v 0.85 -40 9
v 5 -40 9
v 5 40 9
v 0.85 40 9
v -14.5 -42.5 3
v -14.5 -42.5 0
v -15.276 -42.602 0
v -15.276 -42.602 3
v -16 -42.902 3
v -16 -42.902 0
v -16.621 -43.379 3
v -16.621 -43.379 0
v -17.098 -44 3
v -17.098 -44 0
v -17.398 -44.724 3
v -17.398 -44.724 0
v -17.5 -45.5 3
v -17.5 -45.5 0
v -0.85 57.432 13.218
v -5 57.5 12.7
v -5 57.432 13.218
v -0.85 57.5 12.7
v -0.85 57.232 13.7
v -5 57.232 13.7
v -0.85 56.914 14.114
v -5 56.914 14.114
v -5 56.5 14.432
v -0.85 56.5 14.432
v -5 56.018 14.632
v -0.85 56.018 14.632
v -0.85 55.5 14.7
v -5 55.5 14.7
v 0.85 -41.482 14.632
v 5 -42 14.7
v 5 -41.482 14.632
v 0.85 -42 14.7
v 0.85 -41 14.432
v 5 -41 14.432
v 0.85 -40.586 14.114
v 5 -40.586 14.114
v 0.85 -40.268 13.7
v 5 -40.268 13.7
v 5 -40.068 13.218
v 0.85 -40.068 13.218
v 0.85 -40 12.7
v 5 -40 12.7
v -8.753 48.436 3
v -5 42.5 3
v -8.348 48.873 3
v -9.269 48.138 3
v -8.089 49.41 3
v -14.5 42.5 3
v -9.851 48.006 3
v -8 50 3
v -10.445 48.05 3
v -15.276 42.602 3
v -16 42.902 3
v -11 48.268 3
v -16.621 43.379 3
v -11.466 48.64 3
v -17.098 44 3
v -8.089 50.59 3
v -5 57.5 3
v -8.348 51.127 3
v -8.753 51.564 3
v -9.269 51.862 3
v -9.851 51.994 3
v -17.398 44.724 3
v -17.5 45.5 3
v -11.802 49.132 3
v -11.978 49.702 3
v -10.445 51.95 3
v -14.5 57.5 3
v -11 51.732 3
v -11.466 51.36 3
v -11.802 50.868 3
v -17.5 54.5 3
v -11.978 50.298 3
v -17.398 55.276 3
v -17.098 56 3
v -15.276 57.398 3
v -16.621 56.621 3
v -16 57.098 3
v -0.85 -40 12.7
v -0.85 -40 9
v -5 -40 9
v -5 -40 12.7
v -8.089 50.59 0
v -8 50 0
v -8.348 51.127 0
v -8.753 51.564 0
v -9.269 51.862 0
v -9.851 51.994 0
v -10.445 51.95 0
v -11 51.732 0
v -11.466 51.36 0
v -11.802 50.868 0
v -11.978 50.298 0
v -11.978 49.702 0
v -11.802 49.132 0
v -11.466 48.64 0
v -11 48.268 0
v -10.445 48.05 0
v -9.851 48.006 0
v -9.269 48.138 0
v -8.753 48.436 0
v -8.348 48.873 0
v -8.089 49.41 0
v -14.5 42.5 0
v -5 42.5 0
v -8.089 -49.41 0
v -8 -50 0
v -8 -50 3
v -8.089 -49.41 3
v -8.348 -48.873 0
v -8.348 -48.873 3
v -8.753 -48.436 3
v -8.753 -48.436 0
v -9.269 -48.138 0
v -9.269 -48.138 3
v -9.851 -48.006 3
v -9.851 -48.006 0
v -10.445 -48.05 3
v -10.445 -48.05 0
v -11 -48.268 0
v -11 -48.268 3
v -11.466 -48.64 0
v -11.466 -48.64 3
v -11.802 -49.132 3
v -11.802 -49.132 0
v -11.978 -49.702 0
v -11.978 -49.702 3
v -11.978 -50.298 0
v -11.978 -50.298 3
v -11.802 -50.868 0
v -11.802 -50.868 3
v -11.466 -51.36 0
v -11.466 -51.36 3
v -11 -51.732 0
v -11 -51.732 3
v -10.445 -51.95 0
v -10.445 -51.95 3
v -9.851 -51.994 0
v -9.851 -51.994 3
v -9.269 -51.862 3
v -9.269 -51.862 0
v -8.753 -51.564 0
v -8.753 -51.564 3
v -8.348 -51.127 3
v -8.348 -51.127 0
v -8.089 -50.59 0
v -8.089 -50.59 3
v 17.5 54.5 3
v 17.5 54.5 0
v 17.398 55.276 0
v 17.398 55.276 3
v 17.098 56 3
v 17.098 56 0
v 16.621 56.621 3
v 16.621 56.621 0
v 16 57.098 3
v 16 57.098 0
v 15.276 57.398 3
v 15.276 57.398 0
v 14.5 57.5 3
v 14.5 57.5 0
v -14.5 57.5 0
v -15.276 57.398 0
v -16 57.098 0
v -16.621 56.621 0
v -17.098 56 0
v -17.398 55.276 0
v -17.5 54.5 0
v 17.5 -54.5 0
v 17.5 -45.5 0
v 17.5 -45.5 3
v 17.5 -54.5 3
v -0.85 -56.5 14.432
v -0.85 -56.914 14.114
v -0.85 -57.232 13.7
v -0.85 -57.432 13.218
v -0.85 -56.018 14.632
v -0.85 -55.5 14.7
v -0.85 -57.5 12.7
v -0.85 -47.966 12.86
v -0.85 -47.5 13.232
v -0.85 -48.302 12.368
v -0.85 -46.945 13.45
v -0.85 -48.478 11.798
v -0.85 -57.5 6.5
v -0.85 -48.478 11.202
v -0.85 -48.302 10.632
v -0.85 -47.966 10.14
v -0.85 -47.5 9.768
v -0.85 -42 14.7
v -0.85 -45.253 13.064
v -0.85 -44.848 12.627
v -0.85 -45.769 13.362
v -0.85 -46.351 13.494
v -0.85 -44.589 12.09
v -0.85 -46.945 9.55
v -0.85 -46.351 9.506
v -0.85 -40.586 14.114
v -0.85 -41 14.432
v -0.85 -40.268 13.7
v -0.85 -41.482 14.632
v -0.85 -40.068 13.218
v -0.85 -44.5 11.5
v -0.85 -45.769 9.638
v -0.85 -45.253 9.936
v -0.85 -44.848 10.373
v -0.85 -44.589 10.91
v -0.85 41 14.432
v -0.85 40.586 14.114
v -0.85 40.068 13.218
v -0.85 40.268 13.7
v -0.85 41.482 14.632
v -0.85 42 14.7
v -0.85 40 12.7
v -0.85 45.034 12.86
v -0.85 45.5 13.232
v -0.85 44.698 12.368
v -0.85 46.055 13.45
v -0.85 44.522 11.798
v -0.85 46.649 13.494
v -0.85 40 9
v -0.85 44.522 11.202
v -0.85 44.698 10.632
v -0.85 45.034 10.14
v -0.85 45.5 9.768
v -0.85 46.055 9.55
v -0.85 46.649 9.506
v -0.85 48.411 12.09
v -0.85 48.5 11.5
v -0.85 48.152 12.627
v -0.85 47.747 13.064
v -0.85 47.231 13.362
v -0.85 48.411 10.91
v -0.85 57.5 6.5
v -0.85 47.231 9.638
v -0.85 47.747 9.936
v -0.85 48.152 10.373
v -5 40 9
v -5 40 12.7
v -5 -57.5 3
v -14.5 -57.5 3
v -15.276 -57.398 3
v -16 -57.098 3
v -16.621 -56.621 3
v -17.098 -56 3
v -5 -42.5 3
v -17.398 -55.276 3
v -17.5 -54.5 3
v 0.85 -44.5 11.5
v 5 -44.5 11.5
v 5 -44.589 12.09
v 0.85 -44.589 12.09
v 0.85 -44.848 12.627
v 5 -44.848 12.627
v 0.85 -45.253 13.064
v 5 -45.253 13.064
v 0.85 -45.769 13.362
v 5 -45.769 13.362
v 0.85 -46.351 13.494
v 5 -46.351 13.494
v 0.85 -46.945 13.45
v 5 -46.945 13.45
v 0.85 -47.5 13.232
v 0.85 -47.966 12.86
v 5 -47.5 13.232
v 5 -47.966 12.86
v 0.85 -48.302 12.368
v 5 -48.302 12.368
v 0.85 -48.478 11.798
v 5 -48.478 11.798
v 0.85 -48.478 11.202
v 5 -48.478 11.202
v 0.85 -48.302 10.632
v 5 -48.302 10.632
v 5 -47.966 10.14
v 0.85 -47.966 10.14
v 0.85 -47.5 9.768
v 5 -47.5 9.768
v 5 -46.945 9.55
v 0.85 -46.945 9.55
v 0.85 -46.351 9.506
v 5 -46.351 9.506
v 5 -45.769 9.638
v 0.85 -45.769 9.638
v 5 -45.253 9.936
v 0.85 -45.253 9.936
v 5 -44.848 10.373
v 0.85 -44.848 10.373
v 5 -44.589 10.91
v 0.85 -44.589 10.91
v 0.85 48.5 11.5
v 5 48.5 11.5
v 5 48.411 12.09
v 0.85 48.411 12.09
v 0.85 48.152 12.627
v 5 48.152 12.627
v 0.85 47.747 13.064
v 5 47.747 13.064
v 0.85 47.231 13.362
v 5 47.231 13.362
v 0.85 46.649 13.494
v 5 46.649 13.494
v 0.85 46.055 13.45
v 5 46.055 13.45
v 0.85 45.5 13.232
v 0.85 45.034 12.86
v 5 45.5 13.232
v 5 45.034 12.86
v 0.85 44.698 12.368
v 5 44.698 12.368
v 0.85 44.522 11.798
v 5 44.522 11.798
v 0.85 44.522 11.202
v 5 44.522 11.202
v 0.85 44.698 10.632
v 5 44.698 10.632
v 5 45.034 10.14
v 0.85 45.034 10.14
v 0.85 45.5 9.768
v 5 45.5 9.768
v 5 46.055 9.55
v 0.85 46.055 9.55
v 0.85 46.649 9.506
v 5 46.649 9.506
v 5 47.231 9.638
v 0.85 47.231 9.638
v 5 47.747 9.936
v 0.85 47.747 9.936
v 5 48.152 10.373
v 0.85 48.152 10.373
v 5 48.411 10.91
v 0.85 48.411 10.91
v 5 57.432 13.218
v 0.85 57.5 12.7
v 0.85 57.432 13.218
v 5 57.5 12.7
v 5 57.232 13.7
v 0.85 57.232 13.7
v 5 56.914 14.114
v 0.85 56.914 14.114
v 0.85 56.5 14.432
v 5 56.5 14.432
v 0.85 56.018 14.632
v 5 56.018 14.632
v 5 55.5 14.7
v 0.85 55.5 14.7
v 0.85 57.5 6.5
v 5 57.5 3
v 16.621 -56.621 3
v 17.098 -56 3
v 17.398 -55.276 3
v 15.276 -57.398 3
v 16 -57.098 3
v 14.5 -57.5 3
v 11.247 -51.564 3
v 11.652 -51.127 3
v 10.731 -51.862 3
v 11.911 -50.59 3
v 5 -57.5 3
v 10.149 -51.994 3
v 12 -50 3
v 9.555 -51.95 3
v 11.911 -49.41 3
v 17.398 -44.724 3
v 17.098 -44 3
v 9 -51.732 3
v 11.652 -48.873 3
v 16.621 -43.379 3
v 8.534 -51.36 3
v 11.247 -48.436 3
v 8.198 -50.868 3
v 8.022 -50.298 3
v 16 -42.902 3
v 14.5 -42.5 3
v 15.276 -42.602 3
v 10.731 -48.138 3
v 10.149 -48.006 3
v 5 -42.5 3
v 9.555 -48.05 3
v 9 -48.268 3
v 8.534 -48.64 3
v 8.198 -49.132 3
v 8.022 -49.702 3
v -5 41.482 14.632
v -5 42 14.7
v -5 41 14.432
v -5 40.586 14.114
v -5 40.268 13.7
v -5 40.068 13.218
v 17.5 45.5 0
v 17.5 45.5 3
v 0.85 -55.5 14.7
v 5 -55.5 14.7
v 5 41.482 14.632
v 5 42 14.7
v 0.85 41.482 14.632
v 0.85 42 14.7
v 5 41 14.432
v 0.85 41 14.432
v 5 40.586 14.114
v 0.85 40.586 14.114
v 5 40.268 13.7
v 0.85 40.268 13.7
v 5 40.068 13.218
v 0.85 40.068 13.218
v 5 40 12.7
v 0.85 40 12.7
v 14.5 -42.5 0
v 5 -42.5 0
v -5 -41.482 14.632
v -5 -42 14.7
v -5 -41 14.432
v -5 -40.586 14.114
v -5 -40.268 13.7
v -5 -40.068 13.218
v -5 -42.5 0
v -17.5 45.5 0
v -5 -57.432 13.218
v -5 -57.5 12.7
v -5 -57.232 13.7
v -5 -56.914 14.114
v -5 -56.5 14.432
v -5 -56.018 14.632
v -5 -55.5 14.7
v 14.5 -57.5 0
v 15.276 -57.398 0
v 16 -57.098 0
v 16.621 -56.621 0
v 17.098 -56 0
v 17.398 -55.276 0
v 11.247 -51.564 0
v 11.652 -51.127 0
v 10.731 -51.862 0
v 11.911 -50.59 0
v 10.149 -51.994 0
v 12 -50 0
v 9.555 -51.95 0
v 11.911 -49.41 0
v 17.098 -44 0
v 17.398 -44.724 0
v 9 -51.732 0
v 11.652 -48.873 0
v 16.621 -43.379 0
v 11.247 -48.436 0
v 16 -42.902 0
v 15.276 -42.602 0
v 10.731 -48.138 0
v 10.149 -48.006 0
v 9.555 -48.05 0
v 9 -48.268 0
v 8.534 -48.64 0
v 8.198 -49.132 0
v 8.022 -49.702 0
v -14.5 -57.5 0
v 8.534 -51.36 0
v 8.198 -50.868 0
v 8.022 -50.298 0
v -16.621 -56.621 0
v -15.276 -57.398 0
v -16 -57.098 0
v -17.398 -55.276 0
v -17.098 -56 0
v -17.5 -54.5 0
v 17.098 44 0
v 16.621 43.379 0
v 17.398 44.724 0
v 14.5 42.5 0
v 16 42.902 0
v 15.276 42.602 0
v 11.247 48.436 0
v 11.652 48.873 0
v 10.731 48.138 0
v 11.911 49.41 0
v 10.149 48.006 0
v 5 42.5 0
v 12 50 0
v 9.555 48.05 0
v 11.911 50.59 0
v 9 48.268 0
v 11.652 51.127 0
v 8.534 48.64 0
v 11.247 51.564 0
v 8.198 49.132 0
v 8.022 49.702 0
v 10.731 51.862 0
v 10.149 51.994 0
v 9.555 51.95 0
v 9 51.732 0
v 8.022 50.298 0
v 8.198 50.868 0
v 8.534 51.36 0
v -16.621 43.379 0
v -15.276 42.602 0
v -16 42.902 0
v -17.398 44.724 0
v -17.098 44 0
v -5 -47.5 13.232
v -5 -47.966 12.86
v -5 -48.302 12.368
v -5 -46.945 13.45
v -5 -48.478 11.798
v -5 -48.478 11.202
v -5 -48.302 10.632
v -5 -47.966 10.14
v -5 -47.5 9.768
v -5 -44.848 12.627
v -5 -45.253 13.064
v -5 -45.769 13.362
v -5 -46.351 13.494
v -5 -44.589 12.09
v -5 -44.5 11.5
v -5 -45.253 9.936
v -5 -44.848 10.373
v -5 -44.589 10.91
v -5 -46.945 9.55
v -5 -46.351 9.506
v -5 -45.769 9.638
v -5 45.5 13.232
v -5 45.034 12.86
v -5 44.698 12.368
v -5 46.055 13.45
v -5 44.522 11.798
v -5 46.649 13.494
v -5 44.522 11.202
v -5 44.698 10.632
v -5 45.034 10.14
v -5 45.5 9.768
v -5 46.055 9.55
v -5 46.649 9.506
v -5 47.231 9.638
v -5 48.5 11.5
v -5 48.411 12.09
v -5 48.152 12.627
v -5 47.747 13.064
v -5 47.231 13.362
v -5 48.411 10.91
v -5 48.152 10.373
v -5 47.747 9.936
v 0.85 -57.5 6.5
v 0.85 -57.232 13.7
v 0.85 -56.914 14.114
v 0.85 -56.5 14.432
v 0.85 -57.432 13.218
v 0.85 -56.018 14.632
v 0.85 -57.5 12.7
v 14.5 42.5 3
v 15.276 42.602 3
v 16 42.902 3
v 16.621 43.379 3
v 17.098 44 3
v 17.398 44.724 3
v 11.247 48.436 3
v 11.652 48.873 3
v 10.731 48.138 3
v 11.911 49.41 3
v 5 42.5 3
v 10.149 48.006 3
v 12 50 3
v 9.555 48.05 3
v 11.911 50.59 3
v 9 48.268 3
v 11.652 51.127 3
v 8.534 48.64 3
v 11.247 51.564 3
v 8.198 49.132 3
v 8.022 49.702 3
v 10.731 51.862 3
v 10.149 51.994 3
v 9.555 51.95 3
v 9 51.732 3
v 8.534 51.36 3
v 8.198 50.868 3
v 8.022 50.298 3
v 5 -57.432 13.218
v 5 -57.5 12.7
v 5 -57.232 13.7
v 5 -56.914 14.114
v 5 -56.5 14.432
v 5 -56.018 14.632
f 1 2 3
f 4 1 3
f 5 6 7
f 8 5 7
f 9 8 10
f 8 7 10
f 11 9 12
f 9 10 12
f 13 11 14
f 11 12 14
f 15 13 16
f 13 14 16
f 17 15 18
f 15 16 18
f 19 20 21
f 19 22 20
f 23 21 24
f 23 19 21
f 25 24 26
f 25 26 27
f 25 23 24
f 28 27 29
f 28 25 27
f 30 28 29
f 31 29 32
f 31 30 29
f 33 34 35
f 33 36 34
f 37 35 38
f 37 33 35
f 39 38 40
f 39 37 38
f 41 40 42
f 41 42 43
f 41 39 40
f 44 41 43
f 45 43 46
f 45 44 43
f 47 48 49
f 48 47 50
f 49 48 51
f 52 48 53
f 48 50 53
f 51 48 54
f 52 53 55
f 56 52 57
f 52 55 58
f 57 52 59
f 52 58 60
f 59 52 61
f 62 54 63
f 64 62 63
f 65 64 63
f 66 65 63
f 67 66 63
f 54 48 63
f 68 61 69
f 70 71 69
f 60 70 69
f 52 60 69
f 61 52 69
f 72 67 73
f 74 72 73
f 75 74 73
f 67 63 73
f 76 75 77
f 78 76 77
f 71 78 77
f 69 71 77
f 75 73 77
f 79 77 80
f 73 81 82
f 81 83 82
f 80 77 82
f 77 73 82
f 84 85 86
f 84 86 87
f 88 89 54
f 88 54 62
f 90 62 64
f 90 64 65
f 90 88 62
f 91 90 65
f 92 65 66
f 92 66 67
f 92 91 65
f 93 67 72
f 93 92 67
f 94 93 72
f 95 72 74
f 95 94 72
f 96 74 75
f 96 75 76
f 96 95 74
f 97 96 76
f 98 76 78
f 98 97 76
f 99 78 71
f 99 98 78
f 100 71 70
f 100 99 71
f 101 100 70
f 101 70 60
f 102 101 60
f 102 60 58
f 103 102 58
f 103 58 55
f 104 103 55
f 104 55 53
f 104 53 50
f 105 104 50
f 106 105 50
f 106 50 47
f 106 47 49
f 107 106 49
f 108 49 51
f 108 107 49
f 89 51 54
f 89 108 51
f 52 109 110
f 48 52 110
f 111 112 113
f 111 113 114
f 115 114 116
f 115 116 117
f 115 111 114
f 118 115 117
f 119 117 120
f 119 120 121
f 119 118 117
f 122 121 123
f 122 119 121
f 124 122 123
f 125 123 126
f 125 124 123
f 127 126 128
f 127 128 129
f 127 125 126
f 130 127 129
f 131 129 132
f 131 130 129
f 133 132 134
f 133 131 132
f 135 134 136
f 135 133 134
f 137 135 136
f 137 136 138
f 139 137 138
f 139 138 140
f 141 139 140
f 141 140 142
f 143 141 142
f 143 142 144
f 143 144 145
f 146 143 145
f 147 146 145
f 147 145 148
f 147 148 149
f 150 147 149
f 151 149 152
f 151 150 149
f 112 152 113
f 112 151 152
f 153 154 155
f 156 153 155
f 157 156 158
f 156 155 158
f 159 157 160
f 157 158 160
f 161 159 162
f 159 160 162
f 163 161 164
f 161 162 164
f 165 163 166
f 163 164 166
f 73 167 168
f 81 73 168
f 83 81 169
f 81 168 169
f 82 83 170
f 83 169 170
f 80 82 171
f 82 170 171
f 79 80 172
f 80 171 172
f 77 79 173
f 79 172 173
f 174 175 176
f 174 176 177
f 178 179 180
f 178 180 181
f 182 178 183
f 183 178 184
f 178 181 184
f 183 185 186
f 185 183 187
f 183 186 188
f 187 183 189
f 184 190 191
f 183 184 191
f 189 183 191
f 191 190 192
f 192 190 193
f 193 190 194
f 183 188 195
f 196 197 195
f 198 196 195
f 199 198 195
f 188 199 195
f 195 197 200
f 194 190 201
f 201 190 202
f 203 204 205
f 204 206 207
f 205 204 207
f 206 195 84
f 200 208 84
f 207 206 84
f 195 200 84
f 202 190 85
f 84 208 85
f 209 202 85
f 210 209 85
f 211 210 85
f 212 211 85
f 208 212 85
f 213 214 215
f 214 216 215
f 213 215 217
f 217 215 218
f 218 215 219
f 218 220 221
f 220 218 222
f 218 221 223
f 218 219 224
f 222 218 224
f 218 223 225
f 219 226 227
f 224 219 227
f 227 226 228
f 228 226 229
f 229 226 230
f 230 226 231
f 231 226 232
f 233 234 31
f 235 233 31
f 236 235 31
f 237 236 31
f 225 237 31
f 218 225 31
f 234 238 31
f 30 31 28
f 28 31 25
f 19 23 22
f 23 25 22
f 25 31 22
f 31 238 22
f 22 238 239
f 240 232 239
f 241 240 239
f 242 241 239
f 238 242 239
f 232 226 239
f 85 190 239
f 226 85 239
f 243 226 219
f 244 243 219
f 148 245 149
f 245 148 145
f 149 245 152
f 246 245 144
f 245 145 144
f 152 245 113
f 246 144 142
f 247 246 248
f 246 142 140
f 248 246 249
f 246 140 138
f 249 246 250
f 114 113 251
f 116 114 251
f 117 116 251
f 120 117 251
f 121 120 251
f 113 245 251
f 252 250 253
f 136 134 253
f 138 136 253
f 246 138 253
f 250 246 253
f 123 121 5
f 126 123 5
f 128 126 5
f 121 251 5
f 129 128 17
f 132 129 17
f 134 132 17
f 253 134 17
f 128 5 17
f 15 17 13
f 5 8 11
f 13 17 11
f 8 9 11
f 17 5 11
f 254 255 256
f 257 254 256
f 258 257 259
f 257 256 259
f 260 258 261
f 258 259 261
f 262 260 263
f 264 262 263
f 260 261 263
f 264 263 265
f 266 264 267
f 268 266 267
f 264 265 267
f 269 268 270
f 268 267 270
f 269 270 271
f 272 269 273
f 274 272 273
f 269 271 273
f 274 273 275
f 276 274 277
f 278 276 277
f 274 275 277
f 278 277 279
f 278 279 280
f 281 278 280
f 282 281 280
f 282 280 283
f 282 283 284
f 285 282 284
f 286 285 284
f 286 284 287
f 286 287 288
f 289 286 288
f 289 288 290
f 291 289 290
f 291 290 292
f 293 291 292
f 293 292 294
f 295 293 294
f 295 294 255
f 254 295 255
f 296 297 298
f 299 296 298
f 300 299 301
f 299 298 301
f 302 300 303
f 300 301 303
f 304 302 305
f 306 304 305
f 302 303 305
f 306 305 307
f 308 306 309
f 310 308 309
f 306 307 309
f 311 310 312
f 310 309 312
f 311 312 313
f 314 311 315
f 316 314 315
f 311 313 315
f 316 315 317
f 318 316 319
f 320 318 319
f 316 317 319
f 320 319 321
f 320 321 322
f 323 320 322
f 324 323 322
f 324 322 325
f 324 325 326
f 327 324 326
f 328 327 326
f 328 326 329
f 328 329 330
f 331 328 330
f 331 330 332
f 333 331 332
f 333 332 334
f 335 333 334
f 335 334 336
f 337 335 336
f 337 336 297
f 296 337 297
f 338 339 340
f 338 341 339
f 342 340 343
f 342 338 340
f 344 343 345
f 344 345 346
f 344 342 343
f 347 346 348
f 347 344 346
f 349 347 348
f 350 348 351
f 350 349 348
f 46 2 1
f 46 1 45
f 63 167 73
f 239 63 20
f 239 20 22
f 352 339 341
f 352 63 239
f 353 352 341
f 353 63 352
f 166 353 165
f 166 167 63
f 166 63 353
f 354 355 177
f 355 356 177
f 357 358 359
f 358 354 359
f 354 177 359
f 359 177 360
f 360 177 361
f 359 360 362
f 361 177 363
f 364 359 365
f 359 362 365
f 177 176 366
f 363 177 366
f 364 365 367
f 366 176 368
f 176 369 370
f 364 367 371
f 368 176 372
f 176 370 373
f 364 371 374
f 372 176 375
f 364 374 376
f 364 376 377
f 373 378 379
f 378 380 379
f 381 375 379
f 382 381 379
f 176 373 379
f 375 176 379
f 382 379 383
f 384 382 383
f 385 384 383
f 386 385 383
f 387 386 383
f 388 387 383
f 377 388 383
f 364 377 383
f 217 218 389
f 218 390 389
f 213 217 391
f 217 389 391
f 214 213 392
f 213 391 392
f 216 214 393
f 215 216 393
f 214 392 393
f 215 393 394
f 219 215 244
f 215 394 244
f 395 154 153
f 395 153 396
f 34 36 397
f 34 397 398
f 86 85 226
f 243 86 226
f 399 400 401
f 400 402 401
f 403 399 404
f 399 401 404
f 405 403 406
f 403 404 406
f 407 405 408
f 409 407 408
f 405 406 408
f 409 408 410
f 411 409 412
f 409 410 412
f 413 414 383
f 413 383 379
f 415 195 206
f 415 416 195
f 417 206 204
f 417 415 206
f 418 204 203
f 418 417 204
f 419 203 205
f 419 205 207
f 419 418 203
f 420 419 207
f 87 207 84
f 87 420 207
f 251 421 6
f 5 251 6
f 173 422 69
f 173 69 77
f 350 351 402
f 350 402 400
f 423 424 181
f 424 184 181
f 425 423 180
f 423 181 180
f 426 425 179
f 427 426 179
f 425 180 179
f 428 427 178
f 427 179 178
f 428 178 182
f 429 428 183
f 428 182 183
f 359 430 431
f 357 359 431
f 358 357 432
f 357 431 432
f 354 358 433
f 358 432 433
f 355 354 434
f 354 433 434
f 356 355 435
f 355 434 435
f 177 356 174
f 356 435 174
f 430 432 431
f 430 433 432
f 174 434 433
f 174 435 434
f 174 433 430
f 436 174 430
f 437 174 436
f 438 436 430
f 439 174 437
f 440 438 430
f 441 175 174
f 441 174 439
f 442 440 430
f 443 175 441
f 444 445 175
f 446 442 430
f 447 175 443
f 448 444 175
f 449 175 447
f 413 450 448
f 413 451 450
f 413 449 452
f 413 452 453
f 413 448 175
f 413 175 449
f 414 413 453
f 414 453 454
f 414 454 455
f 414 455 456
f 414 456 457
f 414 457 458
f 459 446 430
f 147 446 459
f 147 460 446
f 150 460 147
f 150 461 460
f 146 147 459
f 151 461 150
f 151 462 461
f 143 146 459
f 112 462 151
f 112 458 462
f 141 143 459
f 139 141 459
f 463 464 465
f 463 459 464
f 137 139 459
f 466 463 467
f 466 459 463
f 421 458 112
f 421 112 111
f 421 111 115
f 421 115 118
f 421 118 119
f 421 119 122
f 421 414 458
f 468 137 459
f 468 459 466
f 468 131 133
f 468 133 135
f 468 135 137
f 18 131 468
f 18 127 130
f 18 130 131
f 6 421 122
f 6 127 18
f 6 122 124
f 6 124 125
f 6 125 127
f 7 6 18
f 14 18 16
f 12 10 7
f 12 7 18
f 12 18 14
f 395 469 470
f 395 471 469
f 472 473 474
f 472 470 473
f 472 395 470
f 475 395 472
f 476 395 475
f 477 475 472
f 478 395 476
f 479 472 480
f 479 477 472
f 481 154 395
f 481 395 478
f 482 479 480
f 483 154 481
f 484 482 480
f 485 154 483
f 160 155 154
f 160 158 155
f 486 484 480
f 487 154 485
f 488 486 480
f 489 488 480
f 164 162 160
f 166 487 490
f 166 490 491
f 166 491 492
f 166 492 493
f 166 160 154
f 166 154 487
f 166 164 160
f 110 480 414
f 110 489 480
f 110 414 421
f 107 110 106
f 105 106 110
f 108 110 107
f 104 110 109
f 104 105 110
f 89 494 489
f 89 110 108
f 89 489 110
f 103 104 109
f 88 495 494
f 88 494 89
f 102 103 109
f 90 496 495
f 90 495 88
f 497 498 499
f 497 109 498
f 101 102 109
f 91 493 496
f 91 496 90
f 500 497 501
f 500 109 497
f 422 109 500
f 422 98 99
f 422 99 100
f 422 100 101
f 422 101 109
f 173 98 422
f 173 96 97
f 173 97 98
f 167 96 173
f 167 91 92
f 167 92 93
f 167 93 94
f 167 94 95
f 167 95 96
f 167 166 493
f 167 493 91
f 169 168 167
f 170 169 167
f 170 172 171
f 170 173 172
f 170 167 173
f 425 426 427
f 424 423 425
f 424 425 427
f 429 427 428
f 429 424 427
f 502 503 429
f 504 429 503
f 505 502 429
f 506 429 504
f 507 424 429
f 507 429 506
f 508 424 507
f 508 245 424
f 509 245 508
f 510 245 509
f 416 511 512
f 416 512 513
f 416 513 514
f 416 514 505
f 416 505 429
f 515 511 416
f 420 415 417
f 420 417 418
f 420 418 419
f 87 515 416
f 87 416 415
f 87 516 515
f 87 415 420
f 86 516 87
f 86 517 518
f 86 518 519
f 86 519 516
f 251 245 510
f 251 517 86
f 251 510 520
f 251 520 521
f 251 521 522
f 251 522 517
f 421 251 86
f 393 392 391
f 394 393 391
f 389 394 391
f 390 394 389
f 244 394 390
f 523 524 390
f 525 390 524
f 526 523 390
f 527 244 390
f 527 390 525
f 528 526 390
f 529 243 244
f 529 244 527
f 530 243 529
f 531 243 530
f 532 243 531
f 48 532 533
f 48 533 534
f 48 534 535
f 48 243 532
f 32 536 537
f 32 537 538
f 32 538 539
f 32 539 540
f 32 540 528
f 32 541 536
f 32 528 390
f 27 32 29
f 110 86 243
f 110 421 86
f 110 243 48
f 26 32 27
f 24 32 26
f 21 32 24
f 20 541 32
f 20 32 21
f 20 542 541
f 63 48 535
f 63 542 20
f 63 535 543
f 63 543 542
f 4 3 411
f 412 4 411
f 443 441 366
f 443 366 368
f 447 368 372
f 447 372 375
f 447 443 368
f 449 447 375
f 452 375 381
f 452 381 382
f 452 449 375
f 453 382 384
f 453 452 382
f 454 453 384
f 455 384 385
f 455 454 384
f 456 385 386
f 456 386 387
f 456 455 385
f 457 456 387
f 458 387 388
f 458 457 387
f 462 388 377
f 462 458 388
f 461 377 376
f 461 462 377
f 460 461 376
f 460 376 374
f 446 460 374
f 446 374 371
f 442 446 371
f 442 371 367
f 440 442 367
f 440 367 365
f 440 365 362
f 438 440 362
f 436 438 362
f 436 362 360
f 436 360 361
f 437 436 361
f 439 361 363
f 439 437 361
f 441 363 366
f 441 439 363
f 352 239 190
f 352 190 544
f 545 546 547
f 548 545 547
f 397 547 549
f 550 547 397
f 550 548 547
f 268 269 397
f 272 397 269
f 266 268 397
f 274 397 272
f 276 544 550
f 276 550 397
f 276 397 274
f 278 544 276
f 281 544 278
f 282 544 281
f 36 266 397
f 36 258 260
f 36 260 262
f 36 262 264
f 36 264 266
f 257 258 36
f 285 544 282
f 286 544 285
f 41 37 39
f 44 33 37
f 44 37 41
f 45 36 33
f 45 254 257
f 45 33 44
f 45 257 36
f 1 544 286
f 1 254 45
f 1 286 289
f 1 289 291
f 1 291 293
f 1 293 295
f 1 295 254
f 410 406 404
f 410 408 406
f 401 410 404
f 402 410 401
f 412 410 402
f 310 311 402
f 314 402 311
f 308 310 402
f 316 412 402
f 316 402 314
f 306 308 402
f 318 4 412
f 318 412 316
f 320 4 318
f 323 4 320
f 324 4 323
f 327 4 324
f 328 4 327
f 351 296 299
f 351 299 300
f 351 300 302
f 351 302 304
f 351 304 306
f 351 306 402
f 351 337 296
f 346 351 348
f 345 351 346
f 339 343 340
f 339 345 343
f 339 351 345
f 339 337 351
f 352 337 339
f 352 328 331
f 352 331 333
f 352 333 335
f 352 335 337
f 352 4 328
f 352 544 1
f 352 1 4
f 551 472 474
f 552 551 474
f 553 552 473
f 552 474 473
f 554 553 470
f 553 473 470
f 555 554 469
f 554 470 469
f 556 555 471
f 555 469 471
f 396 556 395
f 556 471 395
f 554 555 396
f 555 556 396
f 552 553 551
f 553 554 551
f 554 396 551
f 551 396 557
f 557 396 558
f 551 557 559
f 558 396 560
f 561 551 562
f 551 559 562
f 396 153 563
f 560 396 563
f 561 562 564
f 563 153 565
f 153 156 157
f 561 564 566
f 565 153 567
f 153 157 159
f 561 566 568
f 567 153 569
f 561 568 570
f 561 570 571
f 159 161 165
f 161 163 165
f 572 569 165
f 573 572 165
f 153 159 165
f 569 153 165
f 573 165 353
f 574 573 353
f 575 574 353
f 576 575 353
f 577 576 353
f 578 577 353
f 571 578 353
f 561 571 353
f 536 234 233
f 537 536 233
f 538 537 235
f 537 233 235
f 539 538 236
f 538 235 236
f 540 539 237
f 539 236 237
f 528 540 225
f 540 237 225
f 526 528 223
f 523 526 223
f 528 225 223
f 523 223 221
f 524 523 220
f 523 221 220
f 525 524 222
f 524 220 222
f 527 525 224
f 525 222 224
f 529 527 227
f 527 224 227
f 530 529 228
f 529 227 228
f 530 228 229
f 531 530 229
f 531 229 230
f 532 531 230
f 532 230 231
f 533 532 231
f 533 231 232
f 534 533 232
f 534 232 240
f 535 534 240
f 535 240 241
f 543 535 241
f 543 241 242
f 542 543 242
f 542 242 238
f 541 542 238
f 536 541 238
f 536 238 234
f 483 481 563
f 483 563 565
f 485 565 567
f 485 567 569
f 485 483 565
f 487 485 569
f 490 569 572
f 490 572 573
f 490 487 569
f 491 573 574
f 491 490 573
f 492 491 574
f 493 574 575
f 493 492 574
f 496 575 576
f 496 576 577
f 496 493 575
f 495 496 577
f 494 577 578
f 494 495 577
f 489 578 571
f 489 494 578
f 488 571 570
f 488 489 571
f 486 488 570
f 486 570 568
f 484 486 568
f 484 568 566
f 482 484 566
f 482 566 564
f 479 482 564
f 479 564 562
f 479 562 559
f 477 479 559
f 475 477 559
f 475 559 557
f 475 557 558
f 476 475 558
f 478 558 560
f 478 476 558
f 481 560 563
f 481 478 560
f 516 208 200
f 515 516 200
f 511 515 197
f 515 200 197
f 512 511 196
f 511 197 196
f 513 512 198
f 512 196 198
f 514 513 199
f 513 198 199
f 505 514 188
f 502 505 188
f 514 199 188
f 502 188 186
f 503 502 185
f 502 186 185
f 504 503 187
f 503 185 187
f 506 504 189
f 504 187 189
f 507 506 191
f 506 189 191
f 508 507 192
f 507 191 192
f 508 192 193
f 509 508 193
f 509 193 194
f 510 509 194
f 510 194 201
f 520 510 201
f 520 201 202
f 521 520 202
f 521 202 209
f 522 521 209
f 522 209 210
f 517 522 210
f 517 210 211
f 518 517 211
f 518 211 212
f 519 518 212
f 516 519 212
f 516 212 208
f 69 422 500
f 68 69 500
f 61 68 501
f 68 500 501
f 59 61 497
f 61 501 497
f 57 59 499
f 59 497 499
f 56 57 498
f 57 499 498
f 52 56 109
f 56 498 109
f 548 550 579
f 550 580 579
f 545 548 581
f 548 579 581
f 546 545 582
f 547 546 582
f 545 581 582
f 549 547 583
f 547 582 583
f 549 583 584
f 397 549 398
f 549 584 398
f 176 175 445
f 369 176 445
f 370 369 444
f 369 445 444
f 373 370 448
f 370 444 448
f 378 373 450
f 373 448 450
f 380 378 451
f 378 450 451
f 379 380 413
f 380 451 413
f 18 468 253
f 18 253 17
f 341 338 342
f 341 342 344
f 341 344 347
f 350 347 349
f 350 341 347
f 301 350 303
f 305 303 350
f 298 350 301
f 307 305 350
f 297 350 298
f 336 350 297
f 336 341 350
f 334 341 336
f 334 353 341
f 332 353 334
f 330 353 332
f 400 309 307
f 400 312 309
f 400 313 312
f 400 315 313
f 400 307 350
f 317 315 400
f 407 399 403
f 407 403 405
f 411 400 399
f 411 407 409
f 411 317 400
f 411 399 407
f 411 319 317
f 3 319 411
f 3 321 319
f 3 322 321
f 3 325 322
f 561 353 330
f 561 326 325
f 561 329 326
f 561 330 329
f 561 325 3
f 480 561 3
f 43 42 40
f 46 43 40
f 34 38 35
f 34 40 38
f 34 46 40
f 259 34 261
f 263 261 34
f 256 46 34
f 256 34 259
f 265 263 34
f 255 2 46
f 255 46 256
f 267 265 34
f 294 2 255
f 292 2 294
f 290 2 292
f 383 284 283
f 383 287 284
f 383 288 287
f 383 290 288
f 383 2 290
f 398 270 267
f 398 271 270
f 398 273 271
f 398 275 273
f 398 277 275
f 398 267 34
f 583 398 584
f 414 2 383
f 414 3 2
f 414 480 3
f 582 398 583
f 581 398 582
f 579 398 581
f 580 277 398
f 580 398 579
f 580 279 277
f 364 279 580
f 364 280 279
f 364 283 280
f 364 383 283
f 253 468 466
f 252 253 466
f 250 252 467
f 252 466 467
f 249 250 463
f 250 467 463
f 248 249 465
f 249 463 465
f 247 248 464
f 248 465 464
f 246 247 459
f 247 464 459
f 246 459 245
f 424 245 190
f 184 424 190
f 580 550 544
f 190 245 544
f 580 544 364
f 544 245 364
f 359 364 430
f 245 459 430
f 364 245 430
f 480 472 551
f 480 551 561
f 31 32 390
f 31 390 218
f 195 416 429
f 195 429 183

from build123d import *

# Parameters (mm, degrees)
SKETCH_R     = 2
PAD_DEPTH    = 3
SKETCH001_W  = 4.15
SKETCH001_H  = 115
PAD001_DEPTH = 11.7
SKETCH002_R  = 2
SKETCH002_W  = 80
SKETCH002_H  = 6
POCKET_DEPTH = 15
SKETCH003_W  = 4.09
SKETCH003_H  = 115
PAD002_DEPTH = 3.5
FILLET_R     = 2
FILLET001_R  = 2
FILLET002_R  = 2
FILLET003_R  = 2


with BuildPart() as part:
    # Sketch → Pad (new body)
    with BuildSketch(Plane.XY):
        with BuildLine():
            Line((-14.5, 57.5), (14.5, 57.5))
            ThreePointArc((17.5, 54.5), (16.62132, 56.62132), (14.5, 57.5))
            Line((17.5, 54.5), (17.5, 45.5))
            ThreePointArc((14.5, 42.5), (16.62132, 43.37868), (17.5, 45.5))
            Line((14.5, 42.5), (5, 42.5))
            Line((5, 42.5), (5, -42.5))
            Line((5, -42.5), (14.5, -42.5))
            ThreePointArc((17.5, -45.5), (16.62132, -43.37868), (14.5, -42.5))
            Line((17.5, -45.5), (17.5, -54.5))
            ThreePointArc((14.5, -57.5), (16.62132, -56.62132), (17.5, -54.5))
            Line((14.5, -57.5), (-14.5, -57.5))
            ThreePointArc((-17.5, -54.5), (-16.62132, -56.62132), (-14.5, -57.5))
            Line((-17.5, -54.5), (-17.5, -45.5))
            ThreePointArc((-14.5, -42.5), (-16.62132, -43.37868), (-17.5, -45.5))
            Line((-5, -42.5), (-14.5, -42.5))
            Line((-5, 42.5), (-5, -42.5))
            Line((-14.5, 42.5), (-5, 42.5))
            ThreePointArc((-17.5, 45.5), (-16.62132, 43.37868), (-14.5, 42.5))
            Line((-17.5, 45.5), (-17.5, 54.5))
            ThreePointArc((-14.5, 57.5), (-16.62132, 56.62132), (-17.5, 54.5))
        make_face()
        with Locations((-10, 50)):
            Circle(SKETCH_R, mode=Mode.SUBTRACT)
        with Locations((10, 50)):
            Circle(SKETCH_R, mode=Mode.SUBTRACT)
        with Locations((-10, -50)):
            Circle(SKETCH_R, mode=Mode.SUBTRACT)
        with Locations((10, -50)):
            Circle(SKETCH_R, mode=Mode.SUBTRACT)
    extrude(amount=PAD_DEPTH)

    # Sketch001 → Pad001 (join)
    with BuildSketch(Plane.XY.offset(3)):
        with Locations((-2.925, 0)):
            Rectangle(SKETCH001_W, SKETCH001_H)
        with Locations((2.925, 0)):
            Rectangle(SKETCH001_W, SKETCH001_H)
    extrude(amount=PAD001_DEPTH)

    # Sketch002 → Pocket (cut)
    with BuildSketch(Plane.YZ.offset(5)):
        with Locations((-46.5, 11.5)):
            Circle(SKETCH002_R)
        with Locations((46.5, 11.5)):
            Circle(SKETCH002_R)
        with Locations((0, 12)):
            Rectangle(SKETCH002_W, SKETCH002_H)
    extrude(amount=-POCKET_DEPTH, mode=Mode.SUBTRACT)

    # Sketch003 → Pad002 (join)
    with BuildSketch(Plane.XY.offset(3)):
        with Locations((0.341939, 0)):
            Rectangle(SKETCH003_W, SKETCH003_H)
    extrude(amount=PAD002_DEPTH)

    # Fillet
    fillet_edges = [part.edges().sort_by_distance(p)[0] for p in [
        (2.925, -57.5, 14.7),
    ]]
    fillet(fillet_edges, radius=FILLET_R)

    # Fillet001
    fillet001_edges = [part.edges().sort_by_distance(p)[0] for p in [
        (-2.925, -57.5, 14.7),
    ]]
    fillet(fillet001_edges, radius=FILLET001_R)

    # Fillet002
    fillet002_edges = [part.edges().sort_by_distance(p)[0] for p in [
        (-2.925, 57.5, 14.7),
        (2.925, 57.5, 14.7),
    ]]
    fillet(fillet002_edges, radius=FILLET002_R)

    # Fillet003
    fillet003_edges = [part.edges().sort_by_distance(p)[0] for p in [
        (-2.925, -40, 14.7),
        (2.925, -40, 14.7),
        (-2.925, 40, 14.7),
        (2.925, 40, 14.7),
    ]]
    fillet(fillet003_edges, radius=FILLET003_R)


solid = part.part
